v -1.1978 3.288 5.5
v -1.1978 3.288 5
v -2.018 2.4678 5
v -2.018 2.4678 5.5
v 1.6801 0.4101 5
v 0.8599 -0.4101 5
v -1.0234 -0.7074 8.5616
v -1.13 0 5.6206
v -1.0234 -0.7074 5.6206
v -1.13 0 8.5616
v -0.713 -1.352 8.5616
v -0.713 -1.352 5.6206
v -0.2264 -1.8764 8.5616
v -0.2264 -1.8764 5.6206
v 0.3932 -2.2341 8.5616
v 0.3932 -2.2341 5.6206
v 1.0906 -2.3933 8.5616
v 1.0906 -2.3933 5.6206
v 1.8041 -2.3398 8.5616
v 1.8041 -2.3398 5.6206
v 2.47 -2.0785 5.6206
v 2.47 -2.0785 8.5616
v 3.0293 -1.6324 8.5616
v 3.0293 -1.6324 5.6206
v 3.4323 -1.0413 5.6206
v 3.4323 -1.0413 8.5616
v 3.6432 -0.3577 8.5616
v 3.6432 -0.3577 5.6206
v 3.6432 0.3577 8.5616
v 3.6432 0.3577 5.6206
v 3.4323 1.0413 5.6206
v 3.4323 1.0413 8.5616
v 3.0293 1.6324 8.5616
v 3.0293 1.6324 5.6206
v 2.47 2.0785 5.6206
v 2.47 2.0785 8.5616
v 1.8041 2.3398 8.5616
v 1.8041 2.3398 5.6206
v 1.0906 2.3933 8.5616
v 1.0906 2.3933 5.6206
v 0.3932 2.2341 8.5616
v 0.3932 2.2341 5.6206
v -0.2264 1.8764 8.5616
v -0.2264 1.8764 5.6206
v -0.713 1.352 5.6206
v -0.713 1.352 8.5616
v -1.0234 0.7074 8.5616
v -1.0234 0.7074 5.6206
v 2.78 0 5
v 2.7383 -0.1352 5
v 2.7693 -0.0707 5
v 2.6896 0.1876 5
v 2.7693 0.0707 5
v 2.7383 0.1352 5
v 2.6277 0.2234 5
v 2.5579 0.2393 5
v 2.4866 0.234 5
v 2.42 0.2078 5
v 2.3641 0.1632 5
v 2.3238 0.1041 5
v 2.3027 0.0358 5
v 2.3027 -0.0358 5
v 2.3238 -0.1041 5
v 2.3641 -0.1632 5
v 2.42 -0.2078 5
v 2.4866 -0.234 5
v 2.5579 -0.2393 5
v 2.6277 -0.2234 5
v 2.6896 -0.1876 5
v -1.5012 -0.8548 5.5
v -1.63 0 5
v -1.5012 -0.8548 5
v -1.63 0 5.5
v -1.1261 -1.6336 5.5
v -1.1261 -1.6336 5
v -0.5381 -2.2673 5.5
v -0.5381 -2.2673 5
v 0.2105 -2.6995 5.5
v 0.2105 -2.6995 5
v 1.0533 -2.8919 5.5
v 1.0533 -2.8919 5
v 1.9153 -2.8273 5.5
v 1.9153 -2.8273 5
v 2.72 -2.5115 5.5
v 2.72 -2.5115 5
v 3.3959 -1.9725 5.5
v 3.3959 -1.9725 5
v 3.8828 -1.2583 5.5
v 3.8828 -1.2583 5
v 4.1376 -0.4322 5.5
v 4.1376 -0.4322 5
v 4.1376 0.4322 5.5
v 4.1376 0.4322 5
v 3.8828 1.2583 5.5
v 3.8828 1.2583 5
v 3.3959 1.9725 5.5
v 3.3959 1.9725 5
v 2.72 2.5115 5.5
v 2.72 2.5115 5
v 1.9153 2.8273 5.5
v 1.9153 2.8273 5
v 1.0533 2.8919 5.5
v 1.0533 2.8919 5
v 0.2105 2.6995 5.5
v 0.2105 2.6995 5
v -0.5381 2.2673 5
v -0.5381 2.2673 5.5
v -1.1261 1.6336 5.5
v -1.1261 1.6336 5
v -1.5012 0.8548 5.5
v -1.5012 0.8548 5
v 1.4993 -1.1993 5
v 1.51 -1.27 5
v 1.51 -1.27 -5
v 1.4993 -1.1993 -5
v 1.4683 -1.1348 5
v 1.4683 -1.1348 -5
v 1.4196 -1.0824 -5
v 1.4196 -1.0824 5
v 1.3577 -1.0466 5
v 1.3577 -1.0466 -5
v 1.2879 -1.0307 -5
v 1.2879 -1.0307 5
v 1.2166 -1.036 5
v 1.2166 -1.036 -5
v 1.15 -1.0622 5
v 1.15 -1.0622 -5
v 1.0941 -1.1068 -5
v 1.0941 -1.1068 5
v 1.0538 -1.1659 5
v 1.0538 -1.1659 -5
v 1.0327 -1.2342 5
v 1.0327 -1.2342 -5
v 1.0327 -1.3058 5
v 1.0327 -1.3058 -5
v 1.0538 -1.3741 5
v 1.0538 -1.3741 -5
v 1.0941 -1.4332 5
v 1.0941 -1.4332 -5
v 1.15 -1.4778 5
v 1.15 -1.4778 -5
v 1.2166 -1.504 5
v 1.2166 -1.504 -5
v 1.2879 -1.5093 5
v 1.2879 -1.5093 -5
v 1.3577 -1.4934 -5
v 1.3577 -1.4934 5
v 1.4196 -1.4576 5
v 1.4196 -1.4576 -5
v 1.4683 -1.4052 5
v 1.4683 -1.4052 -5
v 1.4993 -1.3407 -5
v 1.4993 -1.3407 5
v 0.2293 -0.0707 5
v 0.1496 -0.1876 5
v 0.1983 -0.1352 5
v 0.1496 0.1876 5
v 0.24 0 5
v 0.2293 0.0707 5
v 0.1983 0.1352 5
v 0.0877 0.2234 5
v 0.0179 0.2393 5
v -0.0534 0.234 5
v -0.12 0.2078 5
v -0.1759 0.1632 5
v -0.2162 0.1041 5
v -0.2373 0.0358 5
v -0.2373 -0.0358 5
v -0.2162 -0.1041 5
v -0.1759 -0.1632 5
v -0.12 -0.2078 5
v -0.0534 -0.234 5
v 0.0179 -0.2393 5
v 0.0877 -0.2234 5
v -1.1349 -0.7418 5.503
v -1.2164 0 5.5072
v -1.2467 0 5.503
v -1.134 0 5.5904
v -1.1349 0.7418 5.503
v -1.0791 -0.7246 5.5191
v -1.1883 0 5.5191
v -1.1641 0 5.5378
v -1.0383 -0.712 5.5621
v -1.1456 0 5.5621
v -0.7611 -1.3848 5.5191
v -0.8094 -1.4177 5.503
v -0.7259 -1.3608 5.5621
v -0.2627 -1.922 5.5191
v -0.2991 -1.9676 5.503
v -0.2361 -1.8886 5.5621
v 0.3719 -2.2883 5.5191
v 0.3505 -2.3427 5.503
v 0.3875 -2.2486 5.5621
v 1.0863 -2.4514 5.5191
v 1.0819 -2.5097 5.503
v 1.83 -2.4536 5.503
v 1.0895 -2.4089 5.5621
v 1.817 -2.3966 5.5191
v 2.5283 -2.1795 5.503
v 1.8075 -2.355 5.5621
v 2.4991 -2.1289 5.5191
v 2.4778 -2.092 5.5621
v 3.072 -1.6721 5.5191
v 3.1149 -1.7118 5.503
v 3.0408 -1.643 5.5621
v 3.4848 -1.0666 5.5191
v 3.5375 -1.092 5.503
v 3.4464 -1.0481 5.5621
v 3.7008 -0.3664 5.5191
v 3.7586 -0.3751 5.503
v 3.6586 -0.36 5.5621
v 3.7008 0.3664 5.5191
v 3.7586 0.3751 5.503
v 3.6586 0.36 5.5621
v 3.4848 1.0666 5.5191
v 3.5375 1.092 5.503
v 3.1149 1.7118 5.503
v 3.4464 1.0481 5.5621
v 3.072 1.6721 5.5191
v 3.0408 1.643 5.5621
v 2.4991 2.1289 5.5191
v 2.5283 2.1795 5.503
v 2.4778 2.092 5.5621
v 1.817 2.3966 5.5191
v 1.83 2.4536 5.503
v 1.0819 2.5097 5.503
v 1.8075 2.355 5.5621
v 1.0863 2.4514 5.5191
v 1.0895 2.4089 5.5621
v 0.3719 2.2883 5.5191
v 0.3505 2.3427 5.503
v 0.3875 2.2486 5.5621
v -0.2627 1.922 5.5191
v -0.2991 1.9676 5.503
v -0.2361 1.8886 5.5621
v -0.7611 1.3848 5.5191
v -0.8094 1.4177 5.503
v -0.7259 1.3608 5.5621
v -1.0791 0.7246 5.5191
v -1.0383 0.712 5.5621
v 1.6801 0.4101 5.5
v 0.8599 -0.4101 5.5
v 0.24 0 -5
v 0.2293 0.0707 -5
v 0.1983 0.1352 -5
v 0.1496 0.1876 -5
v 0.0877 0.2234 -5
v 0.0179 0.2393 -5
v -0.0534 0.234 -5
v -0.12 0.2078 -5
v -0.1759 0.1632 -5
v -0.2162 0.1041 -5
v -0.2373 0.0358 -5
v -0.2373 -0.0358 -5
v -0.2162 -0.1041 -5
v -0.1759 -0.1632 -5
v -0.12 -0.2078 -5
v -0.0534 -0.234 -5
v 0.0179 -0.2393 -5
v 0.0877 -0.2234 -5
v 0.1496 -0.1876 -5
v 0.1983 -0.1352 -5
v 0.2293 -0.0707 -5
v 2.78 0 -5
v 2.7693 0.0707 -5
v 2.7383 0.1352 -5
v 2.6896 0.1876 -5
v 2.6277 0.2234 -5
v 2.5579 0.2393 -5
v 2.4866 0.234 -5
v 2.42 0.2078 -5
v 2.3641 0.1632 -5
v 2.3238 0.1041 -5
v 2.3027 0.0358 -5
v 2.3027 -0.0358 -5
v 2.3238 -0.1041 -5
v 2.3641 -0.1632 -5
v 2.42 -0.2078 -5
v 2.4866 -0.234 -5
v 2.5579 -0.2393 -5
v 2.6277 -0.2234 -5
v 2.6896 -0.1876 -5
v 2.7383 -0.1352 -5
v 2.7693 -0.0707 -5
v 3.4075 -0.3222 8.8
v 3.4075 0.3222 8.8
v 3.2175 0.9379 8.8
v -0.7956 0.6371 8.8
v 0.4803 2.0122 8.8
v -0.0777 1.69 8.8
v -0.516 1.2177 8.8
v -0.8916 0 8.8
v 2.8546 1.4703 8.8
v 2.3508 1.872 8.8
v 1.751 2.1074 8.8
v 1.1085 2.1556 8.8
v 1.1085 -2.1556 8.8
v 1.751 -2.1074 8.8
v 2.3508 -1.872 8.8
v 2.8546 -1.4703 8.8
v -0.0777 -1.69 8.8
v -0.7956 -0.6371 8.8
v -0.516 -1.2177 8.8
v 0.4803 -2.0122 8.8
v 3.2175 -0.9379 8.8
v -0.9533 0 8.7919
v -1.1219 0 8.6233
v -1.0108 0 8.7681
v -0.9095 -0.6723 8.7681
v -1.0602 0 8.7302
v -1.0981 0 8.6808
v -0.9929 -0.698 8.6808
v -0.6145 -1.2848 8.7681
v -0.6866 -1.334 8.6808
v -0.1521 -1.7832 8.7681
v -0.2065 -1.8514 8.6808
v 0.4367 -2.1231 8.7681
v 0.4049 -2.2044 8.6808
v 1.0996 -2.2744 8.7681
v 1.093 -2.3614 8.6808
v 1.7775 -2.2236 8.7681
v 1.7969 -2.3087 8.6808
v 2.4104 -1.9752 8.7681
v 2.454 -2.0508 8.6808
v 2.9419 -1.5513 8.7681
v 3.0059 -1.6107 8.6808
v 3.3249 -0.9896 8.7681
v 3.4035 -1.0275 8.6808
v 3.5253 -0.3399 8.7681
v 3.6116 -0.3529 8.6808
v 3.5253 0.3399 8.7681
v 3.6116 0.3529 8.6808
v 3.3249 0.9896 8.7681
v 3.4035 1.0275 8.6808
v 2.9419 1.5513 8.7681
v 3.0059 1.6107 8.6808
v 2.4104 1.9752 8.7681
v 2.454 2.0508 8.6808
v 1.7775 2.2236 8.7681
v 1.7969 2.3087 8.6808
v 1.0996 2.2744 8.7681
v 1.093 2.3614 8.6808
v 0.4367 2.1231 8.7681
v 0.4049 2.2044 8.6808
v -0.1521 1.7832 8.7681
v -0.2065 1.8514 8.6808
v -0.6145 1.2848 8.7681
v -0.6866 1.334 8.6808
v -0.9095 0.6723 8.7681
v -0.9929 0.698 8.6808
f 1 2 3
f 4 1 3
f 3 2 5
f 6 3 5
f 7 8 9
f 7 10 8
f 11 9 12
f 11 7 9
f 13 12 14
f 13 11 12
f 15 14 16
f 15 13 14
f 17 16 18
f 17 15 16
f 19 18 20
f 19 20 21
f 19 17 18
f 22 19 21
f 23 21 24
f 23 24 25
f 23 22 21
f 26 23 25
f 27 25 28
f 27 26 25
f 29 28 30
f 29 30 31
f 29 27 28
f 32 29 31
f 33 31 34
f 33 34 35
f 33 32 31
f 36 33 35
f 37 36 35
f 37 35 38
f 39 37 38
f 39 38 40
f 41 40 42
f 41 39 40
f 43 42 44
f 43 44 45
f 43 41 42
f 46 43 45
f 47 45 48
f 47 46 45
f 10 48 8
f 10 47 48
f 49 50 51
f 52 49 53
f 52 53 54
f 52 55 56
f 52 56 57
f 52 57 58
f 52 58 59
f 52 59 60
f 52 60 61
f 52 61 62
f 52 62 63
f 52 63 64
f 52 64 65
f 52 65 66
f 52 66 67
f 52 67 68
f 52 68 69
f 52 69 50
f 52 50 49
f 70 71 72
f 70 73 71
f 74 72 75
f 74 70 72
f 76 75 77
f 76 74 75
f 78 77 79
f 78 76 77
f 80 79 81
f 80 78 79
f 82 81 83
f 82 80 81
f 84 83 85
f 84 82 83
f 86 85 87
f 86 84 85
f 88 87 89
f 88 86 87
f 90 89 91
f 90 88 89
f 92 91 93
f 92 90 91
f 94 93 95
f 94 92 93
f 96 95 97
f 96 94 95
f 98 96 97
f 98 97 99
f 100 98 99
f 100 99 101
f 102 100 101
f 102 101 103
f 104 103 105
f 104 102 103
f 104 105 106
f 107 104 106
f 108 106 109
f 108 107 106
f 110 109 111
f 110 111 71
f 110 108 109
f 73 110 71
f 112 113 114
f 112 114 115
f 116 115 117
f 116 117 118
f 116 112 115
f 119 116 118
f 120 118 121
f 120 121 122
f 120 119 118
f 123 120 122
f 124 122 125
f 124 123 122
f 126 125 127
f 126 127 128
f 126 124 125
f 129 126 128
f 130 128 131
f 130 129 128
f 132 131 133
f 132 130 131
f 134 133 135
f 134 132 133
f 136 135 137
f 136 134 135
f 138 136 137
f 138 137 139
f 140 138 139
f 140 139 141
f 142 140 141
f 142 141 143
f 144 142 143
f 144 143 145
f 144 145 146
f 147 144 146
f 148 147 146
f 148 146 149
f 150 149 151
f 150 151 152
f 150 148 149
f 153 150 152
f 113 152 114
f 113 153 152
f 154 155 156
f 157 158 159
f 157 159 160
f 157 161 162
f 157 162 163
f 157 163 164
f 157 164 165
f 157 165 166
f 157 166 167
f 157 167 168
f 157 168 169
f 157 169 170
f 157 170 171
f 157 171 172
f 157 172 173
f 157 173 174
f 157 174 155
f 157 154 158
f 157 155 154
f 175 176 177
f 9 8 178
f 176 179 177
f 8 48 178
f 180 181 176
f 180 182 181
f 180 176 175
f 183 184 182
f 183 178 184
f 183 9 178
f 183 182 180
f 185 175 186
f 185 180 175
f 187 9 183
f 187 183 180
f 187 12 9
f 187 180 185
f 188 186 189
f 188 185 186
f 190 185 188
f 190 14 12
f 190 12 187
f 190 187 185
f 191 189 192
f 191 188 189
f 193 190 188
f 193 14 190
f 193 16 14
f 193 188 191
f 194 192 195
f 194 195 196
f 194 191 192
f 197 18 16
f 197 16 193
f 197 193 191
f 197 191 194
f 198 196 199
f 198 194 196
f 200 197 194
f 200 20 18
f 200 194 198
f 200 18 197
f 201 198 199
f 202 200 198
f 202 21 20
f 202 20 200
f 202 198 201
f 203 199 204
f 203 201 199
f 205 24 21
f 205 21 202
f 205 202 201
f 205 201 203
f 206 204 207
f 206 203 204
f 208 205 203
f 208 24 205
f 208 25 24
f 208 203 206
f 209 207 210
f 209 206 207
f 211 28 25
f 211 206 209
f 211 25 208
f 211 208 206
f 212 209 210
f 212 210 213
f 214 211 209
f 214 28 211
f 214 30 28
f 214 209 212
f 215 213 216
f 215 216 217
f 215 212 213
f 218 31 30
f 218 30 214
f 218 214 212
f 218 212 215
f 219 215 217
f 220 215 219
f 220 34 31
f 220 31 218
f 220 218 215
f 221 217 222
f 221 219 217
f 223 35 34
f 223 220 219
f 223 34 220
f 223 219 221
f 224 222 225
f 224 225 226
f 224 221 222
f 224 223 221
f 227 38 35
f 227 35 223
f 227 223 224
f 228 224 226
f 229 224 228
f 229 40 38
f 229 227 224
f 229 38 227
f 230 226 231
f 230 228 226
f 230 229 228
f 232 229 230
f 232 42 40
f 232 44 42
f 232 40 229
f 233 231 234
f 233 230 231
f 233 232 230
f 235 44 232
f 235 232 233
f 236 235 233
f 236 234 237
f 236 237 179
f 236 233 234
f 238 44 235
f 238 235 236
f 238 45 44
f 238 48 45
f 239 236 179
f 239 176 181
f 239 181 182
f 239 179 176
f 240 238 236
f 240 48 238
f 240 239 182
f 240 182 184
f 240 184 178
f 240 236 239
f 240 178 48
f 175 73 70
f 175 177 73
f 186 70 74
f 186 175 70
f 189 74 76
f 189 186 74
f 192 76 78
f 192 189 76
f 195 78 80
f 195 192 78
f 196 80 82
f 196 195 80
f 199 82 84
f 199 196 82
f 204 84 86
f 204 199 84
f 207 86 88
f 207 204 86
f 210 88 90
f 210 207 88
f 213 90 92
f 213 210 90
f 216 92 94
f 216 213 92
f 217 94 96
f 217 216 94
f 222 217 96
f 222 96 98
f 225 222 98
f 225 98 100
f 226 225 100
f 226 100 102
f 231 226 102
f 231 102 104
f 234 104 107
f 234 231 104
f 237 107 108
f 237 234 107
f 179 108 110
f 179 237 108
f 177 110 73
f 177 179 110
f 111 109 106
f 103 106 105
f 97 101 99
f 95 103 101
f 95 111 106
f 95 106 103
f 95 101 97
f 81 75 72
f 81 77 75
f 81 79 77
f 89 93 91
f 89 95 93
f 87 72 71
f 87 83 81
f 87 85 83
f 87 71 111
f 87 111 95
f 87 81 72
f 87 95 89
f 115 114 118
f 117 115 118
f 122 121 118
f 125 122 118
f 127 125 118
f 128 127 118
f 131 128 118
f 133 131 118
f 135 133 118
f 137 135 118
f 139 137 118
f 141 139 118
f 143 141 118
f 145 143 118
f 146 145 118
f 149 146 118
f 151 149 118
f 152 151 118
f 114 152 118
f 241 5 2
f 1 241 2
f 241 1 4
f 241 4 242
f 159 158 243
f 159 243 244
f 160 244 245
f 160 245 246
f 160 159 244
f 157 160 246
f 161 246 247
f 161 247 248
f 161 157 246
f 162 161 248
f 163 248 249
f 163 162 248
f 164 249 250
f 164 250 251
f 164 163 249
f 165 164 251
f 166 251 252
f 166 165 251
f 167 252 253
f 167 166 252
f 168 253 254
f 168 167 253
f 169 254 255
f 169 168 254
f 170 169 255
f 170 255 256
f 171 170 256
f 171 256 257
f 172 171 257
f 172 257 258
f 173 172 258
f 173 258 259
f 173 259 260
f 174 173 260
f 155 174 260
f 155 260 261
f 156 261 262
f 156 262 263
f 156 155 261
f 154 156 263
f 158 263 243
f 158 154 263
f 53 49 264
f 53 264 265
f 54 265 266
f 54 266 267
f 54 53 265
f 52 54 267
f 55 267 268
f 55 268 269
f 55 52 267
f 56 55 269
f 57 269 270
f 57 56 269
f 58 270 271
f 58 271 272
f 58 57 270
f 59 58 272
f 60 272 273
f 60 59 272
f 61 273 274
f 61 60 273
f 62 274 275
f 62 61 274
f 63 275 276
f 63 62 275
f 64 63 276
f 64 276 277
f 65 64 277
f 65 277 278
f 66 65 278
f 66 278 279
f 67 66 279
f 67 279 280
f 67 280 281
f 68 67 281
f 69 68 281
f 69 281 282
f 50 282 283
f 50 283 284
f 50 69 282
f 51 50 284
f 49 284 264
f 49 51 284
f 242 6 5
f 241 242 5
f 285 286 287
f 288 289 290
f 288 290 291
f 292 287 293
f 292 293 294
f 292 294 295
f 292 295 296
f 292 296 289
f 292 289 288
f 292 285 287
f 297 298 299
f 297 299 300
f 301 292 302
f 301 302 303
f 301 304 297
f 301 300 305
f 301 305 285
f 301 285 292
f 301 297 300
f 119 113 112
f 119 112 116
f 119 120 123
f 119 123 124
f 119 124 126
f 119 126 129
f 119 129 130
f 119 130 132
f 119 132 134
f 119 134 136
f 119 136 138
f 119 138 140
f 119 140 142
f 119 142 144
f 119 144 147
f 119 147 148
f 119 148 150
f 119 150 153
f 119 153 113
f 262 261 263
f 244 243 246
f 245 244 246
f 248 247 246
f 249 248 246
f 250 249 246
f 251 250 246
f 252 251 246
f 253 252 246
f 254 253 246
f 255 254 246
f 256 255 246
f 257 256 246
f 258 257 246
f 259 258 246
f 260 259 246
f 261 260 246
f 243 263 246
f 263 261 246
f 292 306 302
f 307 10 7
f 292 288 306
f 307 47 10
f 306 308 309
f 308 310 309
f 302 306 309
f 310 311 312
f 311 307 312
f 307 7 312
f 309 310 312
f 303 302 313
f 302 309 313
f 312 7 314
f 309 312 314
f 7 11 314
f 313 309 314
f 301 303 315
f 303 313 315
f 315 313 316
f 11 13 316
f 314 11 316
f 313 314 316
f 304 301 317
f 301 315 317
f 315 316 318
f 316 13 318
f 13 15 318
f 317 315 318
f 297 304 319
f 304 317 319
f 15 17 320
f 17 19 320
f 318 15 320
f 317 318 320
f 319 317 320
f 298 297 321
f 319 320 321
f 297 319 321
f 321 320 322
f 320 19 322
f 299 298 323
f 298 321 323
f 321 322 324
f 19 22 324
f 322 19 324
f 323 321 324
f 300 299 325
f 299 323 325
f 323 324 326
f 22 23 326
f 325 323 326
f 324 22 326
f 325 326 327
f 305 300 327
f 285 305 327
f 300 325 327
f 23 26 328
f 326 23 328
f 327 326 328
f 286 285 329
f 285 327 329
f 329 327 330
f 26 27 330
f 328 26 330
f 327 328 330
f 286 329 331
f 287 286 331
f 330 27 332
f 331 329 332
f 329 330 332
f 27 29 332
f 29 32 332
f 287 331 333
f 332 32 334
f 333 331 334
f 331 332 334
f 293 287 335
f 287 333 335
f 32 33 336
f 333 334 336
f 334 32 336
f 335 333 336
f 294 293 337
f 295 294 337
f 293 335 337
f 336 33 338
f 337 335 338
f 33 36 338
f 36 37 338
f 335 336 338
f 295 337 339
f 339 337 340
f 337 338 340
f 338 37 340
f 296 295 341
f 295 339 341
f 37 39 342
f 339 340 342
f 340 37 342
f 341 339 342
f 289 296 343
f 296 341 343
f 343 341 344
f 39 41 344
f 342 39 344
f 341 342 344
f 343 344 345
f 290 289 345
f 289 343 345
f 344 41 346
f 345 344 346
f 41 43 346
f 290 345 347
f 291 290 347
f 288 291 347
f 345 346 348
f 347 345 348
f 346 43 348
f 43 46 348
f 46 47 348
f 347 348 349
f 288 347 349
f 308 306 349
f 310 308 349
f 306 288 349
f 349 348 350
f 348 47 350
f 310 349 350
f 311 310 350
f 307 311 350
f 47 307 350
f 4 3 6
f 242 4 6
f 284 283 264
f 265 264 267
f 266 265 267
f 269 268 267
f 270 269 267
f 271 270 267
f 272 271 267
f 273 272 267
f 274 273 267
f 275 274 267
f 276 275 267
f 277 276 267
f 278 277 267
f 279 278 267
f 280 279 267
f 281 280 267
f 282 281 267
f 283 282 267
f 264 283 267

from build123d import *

# Parameters (mm, degrees)
SKETCH_R     = 0.24
PAD_DEPTH    = 10
PAD003_DEPTH = 0.5


with BuildPart() as pad:
    # Sketch → Pad (new body)
    with BuildSketch(Plane.XY.offset(5)):
        Circle(SKETCH_R)
        with Locations((2.54, 0)):
            Circle(SKETCH_R)
        with Locations((1.27, -1.27)):
            Circle(SKETCH_R)
    extrude(amount=-PAD_DEPTH)


with BuildPart() as revolution:
    # Sketch003 → Revolution (revolve)
    with BuildSketch(Plane.XZ):
        with BuildLine():
            Line((1.27, 5), (-1.63, 5))
            Line((-1.63, 5), (-1.63, 5.5))
            Line((-1.63, 5.5), (-1.246699, 5.503024))
            ThreePointArc((-1.246699, 5.503024), (-1.164125, 5.537801), (-1.13, 5.620646))
            Line((-1.13, 5.620646), (-1.13, 8.561603))
            ThreePointArc((-0.891603, 8.8), (-1.060175, 8.730175), (-1.13, 8.561603))
            Line((-0.891603, 8.8), (1.27, 8.8))
            Line((1.27, 8.8), (1.27, 5))
        make_face()
    revolve(axis=Axis((1.27, 0, 2.550668), (0, 0, 1)))


with BuildPart() as pad003:
    # Sketch004 → Pad003 (new body)
    with BuildSketch(Plane.XY.offset(5)):
        Polygon((1.680122, 0.410122), (-1.197803, 3.288047), (-2.018047, 2.467803), (0.859878, -0.410122), align=None)
    extrude(amount=PAD003_DEPTH)


solid = Compound([pad.part, revolution.part, pad003.part])
